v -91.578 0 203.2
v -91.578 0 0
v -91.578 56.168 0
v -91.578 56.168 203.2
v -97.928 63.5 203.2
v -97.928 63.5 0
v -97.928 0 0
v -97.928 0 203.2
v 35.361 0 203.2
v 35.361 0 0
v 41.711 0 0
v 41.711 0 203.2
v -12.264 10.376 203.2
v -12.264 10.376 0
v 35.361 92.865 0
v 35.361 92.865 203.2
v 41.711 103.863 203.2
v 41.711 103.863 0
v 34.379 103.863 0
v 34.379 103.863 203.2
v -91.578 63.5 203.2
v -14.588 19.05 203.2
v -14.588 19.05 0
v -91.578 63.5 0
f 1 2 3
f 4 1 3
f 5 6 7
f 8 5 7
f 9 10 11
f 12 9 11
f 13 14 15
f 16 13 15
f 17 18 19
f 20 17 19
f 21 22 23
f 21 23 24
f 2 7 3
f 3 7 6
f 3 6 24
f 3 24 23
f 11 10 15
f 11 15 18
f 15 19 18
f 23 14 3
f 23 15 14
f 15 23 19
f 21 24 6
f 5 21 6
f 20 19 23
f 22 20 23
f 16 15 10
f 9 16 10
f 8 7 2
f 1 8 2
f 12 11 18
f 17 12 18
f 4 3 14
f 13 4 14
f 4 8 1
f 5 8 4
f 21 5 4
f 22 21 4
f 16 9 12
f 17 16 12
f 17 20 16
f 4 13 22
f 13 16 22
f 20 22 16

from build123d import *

# Parameters (mm, degrees)
F1_DEPTH = 203.2


with BuildPart() as f1:
    # F0 (on Top) → F1 (new body)
    with BuildSketch(Plane.XY):
        Polygon((-97.927715, 63.5), (-97.927715, 0), (-91.577715, 0), (-91.577715, 56.167652), (-91.577715, 63.5), align=None)
        Polygon((-91.577715, 63.5), (-91.577715, 56.167652), (-12.263796, 10.375739), (35.361204, 92.864658), (35.361204, 0), (41.711204, 0), (41.711204, 103.863181), (34.378856, 103.863181), (-14.588057, 19.05), align=None)
    extrude(amount=F1_DEPTH)


solid = f1.part
